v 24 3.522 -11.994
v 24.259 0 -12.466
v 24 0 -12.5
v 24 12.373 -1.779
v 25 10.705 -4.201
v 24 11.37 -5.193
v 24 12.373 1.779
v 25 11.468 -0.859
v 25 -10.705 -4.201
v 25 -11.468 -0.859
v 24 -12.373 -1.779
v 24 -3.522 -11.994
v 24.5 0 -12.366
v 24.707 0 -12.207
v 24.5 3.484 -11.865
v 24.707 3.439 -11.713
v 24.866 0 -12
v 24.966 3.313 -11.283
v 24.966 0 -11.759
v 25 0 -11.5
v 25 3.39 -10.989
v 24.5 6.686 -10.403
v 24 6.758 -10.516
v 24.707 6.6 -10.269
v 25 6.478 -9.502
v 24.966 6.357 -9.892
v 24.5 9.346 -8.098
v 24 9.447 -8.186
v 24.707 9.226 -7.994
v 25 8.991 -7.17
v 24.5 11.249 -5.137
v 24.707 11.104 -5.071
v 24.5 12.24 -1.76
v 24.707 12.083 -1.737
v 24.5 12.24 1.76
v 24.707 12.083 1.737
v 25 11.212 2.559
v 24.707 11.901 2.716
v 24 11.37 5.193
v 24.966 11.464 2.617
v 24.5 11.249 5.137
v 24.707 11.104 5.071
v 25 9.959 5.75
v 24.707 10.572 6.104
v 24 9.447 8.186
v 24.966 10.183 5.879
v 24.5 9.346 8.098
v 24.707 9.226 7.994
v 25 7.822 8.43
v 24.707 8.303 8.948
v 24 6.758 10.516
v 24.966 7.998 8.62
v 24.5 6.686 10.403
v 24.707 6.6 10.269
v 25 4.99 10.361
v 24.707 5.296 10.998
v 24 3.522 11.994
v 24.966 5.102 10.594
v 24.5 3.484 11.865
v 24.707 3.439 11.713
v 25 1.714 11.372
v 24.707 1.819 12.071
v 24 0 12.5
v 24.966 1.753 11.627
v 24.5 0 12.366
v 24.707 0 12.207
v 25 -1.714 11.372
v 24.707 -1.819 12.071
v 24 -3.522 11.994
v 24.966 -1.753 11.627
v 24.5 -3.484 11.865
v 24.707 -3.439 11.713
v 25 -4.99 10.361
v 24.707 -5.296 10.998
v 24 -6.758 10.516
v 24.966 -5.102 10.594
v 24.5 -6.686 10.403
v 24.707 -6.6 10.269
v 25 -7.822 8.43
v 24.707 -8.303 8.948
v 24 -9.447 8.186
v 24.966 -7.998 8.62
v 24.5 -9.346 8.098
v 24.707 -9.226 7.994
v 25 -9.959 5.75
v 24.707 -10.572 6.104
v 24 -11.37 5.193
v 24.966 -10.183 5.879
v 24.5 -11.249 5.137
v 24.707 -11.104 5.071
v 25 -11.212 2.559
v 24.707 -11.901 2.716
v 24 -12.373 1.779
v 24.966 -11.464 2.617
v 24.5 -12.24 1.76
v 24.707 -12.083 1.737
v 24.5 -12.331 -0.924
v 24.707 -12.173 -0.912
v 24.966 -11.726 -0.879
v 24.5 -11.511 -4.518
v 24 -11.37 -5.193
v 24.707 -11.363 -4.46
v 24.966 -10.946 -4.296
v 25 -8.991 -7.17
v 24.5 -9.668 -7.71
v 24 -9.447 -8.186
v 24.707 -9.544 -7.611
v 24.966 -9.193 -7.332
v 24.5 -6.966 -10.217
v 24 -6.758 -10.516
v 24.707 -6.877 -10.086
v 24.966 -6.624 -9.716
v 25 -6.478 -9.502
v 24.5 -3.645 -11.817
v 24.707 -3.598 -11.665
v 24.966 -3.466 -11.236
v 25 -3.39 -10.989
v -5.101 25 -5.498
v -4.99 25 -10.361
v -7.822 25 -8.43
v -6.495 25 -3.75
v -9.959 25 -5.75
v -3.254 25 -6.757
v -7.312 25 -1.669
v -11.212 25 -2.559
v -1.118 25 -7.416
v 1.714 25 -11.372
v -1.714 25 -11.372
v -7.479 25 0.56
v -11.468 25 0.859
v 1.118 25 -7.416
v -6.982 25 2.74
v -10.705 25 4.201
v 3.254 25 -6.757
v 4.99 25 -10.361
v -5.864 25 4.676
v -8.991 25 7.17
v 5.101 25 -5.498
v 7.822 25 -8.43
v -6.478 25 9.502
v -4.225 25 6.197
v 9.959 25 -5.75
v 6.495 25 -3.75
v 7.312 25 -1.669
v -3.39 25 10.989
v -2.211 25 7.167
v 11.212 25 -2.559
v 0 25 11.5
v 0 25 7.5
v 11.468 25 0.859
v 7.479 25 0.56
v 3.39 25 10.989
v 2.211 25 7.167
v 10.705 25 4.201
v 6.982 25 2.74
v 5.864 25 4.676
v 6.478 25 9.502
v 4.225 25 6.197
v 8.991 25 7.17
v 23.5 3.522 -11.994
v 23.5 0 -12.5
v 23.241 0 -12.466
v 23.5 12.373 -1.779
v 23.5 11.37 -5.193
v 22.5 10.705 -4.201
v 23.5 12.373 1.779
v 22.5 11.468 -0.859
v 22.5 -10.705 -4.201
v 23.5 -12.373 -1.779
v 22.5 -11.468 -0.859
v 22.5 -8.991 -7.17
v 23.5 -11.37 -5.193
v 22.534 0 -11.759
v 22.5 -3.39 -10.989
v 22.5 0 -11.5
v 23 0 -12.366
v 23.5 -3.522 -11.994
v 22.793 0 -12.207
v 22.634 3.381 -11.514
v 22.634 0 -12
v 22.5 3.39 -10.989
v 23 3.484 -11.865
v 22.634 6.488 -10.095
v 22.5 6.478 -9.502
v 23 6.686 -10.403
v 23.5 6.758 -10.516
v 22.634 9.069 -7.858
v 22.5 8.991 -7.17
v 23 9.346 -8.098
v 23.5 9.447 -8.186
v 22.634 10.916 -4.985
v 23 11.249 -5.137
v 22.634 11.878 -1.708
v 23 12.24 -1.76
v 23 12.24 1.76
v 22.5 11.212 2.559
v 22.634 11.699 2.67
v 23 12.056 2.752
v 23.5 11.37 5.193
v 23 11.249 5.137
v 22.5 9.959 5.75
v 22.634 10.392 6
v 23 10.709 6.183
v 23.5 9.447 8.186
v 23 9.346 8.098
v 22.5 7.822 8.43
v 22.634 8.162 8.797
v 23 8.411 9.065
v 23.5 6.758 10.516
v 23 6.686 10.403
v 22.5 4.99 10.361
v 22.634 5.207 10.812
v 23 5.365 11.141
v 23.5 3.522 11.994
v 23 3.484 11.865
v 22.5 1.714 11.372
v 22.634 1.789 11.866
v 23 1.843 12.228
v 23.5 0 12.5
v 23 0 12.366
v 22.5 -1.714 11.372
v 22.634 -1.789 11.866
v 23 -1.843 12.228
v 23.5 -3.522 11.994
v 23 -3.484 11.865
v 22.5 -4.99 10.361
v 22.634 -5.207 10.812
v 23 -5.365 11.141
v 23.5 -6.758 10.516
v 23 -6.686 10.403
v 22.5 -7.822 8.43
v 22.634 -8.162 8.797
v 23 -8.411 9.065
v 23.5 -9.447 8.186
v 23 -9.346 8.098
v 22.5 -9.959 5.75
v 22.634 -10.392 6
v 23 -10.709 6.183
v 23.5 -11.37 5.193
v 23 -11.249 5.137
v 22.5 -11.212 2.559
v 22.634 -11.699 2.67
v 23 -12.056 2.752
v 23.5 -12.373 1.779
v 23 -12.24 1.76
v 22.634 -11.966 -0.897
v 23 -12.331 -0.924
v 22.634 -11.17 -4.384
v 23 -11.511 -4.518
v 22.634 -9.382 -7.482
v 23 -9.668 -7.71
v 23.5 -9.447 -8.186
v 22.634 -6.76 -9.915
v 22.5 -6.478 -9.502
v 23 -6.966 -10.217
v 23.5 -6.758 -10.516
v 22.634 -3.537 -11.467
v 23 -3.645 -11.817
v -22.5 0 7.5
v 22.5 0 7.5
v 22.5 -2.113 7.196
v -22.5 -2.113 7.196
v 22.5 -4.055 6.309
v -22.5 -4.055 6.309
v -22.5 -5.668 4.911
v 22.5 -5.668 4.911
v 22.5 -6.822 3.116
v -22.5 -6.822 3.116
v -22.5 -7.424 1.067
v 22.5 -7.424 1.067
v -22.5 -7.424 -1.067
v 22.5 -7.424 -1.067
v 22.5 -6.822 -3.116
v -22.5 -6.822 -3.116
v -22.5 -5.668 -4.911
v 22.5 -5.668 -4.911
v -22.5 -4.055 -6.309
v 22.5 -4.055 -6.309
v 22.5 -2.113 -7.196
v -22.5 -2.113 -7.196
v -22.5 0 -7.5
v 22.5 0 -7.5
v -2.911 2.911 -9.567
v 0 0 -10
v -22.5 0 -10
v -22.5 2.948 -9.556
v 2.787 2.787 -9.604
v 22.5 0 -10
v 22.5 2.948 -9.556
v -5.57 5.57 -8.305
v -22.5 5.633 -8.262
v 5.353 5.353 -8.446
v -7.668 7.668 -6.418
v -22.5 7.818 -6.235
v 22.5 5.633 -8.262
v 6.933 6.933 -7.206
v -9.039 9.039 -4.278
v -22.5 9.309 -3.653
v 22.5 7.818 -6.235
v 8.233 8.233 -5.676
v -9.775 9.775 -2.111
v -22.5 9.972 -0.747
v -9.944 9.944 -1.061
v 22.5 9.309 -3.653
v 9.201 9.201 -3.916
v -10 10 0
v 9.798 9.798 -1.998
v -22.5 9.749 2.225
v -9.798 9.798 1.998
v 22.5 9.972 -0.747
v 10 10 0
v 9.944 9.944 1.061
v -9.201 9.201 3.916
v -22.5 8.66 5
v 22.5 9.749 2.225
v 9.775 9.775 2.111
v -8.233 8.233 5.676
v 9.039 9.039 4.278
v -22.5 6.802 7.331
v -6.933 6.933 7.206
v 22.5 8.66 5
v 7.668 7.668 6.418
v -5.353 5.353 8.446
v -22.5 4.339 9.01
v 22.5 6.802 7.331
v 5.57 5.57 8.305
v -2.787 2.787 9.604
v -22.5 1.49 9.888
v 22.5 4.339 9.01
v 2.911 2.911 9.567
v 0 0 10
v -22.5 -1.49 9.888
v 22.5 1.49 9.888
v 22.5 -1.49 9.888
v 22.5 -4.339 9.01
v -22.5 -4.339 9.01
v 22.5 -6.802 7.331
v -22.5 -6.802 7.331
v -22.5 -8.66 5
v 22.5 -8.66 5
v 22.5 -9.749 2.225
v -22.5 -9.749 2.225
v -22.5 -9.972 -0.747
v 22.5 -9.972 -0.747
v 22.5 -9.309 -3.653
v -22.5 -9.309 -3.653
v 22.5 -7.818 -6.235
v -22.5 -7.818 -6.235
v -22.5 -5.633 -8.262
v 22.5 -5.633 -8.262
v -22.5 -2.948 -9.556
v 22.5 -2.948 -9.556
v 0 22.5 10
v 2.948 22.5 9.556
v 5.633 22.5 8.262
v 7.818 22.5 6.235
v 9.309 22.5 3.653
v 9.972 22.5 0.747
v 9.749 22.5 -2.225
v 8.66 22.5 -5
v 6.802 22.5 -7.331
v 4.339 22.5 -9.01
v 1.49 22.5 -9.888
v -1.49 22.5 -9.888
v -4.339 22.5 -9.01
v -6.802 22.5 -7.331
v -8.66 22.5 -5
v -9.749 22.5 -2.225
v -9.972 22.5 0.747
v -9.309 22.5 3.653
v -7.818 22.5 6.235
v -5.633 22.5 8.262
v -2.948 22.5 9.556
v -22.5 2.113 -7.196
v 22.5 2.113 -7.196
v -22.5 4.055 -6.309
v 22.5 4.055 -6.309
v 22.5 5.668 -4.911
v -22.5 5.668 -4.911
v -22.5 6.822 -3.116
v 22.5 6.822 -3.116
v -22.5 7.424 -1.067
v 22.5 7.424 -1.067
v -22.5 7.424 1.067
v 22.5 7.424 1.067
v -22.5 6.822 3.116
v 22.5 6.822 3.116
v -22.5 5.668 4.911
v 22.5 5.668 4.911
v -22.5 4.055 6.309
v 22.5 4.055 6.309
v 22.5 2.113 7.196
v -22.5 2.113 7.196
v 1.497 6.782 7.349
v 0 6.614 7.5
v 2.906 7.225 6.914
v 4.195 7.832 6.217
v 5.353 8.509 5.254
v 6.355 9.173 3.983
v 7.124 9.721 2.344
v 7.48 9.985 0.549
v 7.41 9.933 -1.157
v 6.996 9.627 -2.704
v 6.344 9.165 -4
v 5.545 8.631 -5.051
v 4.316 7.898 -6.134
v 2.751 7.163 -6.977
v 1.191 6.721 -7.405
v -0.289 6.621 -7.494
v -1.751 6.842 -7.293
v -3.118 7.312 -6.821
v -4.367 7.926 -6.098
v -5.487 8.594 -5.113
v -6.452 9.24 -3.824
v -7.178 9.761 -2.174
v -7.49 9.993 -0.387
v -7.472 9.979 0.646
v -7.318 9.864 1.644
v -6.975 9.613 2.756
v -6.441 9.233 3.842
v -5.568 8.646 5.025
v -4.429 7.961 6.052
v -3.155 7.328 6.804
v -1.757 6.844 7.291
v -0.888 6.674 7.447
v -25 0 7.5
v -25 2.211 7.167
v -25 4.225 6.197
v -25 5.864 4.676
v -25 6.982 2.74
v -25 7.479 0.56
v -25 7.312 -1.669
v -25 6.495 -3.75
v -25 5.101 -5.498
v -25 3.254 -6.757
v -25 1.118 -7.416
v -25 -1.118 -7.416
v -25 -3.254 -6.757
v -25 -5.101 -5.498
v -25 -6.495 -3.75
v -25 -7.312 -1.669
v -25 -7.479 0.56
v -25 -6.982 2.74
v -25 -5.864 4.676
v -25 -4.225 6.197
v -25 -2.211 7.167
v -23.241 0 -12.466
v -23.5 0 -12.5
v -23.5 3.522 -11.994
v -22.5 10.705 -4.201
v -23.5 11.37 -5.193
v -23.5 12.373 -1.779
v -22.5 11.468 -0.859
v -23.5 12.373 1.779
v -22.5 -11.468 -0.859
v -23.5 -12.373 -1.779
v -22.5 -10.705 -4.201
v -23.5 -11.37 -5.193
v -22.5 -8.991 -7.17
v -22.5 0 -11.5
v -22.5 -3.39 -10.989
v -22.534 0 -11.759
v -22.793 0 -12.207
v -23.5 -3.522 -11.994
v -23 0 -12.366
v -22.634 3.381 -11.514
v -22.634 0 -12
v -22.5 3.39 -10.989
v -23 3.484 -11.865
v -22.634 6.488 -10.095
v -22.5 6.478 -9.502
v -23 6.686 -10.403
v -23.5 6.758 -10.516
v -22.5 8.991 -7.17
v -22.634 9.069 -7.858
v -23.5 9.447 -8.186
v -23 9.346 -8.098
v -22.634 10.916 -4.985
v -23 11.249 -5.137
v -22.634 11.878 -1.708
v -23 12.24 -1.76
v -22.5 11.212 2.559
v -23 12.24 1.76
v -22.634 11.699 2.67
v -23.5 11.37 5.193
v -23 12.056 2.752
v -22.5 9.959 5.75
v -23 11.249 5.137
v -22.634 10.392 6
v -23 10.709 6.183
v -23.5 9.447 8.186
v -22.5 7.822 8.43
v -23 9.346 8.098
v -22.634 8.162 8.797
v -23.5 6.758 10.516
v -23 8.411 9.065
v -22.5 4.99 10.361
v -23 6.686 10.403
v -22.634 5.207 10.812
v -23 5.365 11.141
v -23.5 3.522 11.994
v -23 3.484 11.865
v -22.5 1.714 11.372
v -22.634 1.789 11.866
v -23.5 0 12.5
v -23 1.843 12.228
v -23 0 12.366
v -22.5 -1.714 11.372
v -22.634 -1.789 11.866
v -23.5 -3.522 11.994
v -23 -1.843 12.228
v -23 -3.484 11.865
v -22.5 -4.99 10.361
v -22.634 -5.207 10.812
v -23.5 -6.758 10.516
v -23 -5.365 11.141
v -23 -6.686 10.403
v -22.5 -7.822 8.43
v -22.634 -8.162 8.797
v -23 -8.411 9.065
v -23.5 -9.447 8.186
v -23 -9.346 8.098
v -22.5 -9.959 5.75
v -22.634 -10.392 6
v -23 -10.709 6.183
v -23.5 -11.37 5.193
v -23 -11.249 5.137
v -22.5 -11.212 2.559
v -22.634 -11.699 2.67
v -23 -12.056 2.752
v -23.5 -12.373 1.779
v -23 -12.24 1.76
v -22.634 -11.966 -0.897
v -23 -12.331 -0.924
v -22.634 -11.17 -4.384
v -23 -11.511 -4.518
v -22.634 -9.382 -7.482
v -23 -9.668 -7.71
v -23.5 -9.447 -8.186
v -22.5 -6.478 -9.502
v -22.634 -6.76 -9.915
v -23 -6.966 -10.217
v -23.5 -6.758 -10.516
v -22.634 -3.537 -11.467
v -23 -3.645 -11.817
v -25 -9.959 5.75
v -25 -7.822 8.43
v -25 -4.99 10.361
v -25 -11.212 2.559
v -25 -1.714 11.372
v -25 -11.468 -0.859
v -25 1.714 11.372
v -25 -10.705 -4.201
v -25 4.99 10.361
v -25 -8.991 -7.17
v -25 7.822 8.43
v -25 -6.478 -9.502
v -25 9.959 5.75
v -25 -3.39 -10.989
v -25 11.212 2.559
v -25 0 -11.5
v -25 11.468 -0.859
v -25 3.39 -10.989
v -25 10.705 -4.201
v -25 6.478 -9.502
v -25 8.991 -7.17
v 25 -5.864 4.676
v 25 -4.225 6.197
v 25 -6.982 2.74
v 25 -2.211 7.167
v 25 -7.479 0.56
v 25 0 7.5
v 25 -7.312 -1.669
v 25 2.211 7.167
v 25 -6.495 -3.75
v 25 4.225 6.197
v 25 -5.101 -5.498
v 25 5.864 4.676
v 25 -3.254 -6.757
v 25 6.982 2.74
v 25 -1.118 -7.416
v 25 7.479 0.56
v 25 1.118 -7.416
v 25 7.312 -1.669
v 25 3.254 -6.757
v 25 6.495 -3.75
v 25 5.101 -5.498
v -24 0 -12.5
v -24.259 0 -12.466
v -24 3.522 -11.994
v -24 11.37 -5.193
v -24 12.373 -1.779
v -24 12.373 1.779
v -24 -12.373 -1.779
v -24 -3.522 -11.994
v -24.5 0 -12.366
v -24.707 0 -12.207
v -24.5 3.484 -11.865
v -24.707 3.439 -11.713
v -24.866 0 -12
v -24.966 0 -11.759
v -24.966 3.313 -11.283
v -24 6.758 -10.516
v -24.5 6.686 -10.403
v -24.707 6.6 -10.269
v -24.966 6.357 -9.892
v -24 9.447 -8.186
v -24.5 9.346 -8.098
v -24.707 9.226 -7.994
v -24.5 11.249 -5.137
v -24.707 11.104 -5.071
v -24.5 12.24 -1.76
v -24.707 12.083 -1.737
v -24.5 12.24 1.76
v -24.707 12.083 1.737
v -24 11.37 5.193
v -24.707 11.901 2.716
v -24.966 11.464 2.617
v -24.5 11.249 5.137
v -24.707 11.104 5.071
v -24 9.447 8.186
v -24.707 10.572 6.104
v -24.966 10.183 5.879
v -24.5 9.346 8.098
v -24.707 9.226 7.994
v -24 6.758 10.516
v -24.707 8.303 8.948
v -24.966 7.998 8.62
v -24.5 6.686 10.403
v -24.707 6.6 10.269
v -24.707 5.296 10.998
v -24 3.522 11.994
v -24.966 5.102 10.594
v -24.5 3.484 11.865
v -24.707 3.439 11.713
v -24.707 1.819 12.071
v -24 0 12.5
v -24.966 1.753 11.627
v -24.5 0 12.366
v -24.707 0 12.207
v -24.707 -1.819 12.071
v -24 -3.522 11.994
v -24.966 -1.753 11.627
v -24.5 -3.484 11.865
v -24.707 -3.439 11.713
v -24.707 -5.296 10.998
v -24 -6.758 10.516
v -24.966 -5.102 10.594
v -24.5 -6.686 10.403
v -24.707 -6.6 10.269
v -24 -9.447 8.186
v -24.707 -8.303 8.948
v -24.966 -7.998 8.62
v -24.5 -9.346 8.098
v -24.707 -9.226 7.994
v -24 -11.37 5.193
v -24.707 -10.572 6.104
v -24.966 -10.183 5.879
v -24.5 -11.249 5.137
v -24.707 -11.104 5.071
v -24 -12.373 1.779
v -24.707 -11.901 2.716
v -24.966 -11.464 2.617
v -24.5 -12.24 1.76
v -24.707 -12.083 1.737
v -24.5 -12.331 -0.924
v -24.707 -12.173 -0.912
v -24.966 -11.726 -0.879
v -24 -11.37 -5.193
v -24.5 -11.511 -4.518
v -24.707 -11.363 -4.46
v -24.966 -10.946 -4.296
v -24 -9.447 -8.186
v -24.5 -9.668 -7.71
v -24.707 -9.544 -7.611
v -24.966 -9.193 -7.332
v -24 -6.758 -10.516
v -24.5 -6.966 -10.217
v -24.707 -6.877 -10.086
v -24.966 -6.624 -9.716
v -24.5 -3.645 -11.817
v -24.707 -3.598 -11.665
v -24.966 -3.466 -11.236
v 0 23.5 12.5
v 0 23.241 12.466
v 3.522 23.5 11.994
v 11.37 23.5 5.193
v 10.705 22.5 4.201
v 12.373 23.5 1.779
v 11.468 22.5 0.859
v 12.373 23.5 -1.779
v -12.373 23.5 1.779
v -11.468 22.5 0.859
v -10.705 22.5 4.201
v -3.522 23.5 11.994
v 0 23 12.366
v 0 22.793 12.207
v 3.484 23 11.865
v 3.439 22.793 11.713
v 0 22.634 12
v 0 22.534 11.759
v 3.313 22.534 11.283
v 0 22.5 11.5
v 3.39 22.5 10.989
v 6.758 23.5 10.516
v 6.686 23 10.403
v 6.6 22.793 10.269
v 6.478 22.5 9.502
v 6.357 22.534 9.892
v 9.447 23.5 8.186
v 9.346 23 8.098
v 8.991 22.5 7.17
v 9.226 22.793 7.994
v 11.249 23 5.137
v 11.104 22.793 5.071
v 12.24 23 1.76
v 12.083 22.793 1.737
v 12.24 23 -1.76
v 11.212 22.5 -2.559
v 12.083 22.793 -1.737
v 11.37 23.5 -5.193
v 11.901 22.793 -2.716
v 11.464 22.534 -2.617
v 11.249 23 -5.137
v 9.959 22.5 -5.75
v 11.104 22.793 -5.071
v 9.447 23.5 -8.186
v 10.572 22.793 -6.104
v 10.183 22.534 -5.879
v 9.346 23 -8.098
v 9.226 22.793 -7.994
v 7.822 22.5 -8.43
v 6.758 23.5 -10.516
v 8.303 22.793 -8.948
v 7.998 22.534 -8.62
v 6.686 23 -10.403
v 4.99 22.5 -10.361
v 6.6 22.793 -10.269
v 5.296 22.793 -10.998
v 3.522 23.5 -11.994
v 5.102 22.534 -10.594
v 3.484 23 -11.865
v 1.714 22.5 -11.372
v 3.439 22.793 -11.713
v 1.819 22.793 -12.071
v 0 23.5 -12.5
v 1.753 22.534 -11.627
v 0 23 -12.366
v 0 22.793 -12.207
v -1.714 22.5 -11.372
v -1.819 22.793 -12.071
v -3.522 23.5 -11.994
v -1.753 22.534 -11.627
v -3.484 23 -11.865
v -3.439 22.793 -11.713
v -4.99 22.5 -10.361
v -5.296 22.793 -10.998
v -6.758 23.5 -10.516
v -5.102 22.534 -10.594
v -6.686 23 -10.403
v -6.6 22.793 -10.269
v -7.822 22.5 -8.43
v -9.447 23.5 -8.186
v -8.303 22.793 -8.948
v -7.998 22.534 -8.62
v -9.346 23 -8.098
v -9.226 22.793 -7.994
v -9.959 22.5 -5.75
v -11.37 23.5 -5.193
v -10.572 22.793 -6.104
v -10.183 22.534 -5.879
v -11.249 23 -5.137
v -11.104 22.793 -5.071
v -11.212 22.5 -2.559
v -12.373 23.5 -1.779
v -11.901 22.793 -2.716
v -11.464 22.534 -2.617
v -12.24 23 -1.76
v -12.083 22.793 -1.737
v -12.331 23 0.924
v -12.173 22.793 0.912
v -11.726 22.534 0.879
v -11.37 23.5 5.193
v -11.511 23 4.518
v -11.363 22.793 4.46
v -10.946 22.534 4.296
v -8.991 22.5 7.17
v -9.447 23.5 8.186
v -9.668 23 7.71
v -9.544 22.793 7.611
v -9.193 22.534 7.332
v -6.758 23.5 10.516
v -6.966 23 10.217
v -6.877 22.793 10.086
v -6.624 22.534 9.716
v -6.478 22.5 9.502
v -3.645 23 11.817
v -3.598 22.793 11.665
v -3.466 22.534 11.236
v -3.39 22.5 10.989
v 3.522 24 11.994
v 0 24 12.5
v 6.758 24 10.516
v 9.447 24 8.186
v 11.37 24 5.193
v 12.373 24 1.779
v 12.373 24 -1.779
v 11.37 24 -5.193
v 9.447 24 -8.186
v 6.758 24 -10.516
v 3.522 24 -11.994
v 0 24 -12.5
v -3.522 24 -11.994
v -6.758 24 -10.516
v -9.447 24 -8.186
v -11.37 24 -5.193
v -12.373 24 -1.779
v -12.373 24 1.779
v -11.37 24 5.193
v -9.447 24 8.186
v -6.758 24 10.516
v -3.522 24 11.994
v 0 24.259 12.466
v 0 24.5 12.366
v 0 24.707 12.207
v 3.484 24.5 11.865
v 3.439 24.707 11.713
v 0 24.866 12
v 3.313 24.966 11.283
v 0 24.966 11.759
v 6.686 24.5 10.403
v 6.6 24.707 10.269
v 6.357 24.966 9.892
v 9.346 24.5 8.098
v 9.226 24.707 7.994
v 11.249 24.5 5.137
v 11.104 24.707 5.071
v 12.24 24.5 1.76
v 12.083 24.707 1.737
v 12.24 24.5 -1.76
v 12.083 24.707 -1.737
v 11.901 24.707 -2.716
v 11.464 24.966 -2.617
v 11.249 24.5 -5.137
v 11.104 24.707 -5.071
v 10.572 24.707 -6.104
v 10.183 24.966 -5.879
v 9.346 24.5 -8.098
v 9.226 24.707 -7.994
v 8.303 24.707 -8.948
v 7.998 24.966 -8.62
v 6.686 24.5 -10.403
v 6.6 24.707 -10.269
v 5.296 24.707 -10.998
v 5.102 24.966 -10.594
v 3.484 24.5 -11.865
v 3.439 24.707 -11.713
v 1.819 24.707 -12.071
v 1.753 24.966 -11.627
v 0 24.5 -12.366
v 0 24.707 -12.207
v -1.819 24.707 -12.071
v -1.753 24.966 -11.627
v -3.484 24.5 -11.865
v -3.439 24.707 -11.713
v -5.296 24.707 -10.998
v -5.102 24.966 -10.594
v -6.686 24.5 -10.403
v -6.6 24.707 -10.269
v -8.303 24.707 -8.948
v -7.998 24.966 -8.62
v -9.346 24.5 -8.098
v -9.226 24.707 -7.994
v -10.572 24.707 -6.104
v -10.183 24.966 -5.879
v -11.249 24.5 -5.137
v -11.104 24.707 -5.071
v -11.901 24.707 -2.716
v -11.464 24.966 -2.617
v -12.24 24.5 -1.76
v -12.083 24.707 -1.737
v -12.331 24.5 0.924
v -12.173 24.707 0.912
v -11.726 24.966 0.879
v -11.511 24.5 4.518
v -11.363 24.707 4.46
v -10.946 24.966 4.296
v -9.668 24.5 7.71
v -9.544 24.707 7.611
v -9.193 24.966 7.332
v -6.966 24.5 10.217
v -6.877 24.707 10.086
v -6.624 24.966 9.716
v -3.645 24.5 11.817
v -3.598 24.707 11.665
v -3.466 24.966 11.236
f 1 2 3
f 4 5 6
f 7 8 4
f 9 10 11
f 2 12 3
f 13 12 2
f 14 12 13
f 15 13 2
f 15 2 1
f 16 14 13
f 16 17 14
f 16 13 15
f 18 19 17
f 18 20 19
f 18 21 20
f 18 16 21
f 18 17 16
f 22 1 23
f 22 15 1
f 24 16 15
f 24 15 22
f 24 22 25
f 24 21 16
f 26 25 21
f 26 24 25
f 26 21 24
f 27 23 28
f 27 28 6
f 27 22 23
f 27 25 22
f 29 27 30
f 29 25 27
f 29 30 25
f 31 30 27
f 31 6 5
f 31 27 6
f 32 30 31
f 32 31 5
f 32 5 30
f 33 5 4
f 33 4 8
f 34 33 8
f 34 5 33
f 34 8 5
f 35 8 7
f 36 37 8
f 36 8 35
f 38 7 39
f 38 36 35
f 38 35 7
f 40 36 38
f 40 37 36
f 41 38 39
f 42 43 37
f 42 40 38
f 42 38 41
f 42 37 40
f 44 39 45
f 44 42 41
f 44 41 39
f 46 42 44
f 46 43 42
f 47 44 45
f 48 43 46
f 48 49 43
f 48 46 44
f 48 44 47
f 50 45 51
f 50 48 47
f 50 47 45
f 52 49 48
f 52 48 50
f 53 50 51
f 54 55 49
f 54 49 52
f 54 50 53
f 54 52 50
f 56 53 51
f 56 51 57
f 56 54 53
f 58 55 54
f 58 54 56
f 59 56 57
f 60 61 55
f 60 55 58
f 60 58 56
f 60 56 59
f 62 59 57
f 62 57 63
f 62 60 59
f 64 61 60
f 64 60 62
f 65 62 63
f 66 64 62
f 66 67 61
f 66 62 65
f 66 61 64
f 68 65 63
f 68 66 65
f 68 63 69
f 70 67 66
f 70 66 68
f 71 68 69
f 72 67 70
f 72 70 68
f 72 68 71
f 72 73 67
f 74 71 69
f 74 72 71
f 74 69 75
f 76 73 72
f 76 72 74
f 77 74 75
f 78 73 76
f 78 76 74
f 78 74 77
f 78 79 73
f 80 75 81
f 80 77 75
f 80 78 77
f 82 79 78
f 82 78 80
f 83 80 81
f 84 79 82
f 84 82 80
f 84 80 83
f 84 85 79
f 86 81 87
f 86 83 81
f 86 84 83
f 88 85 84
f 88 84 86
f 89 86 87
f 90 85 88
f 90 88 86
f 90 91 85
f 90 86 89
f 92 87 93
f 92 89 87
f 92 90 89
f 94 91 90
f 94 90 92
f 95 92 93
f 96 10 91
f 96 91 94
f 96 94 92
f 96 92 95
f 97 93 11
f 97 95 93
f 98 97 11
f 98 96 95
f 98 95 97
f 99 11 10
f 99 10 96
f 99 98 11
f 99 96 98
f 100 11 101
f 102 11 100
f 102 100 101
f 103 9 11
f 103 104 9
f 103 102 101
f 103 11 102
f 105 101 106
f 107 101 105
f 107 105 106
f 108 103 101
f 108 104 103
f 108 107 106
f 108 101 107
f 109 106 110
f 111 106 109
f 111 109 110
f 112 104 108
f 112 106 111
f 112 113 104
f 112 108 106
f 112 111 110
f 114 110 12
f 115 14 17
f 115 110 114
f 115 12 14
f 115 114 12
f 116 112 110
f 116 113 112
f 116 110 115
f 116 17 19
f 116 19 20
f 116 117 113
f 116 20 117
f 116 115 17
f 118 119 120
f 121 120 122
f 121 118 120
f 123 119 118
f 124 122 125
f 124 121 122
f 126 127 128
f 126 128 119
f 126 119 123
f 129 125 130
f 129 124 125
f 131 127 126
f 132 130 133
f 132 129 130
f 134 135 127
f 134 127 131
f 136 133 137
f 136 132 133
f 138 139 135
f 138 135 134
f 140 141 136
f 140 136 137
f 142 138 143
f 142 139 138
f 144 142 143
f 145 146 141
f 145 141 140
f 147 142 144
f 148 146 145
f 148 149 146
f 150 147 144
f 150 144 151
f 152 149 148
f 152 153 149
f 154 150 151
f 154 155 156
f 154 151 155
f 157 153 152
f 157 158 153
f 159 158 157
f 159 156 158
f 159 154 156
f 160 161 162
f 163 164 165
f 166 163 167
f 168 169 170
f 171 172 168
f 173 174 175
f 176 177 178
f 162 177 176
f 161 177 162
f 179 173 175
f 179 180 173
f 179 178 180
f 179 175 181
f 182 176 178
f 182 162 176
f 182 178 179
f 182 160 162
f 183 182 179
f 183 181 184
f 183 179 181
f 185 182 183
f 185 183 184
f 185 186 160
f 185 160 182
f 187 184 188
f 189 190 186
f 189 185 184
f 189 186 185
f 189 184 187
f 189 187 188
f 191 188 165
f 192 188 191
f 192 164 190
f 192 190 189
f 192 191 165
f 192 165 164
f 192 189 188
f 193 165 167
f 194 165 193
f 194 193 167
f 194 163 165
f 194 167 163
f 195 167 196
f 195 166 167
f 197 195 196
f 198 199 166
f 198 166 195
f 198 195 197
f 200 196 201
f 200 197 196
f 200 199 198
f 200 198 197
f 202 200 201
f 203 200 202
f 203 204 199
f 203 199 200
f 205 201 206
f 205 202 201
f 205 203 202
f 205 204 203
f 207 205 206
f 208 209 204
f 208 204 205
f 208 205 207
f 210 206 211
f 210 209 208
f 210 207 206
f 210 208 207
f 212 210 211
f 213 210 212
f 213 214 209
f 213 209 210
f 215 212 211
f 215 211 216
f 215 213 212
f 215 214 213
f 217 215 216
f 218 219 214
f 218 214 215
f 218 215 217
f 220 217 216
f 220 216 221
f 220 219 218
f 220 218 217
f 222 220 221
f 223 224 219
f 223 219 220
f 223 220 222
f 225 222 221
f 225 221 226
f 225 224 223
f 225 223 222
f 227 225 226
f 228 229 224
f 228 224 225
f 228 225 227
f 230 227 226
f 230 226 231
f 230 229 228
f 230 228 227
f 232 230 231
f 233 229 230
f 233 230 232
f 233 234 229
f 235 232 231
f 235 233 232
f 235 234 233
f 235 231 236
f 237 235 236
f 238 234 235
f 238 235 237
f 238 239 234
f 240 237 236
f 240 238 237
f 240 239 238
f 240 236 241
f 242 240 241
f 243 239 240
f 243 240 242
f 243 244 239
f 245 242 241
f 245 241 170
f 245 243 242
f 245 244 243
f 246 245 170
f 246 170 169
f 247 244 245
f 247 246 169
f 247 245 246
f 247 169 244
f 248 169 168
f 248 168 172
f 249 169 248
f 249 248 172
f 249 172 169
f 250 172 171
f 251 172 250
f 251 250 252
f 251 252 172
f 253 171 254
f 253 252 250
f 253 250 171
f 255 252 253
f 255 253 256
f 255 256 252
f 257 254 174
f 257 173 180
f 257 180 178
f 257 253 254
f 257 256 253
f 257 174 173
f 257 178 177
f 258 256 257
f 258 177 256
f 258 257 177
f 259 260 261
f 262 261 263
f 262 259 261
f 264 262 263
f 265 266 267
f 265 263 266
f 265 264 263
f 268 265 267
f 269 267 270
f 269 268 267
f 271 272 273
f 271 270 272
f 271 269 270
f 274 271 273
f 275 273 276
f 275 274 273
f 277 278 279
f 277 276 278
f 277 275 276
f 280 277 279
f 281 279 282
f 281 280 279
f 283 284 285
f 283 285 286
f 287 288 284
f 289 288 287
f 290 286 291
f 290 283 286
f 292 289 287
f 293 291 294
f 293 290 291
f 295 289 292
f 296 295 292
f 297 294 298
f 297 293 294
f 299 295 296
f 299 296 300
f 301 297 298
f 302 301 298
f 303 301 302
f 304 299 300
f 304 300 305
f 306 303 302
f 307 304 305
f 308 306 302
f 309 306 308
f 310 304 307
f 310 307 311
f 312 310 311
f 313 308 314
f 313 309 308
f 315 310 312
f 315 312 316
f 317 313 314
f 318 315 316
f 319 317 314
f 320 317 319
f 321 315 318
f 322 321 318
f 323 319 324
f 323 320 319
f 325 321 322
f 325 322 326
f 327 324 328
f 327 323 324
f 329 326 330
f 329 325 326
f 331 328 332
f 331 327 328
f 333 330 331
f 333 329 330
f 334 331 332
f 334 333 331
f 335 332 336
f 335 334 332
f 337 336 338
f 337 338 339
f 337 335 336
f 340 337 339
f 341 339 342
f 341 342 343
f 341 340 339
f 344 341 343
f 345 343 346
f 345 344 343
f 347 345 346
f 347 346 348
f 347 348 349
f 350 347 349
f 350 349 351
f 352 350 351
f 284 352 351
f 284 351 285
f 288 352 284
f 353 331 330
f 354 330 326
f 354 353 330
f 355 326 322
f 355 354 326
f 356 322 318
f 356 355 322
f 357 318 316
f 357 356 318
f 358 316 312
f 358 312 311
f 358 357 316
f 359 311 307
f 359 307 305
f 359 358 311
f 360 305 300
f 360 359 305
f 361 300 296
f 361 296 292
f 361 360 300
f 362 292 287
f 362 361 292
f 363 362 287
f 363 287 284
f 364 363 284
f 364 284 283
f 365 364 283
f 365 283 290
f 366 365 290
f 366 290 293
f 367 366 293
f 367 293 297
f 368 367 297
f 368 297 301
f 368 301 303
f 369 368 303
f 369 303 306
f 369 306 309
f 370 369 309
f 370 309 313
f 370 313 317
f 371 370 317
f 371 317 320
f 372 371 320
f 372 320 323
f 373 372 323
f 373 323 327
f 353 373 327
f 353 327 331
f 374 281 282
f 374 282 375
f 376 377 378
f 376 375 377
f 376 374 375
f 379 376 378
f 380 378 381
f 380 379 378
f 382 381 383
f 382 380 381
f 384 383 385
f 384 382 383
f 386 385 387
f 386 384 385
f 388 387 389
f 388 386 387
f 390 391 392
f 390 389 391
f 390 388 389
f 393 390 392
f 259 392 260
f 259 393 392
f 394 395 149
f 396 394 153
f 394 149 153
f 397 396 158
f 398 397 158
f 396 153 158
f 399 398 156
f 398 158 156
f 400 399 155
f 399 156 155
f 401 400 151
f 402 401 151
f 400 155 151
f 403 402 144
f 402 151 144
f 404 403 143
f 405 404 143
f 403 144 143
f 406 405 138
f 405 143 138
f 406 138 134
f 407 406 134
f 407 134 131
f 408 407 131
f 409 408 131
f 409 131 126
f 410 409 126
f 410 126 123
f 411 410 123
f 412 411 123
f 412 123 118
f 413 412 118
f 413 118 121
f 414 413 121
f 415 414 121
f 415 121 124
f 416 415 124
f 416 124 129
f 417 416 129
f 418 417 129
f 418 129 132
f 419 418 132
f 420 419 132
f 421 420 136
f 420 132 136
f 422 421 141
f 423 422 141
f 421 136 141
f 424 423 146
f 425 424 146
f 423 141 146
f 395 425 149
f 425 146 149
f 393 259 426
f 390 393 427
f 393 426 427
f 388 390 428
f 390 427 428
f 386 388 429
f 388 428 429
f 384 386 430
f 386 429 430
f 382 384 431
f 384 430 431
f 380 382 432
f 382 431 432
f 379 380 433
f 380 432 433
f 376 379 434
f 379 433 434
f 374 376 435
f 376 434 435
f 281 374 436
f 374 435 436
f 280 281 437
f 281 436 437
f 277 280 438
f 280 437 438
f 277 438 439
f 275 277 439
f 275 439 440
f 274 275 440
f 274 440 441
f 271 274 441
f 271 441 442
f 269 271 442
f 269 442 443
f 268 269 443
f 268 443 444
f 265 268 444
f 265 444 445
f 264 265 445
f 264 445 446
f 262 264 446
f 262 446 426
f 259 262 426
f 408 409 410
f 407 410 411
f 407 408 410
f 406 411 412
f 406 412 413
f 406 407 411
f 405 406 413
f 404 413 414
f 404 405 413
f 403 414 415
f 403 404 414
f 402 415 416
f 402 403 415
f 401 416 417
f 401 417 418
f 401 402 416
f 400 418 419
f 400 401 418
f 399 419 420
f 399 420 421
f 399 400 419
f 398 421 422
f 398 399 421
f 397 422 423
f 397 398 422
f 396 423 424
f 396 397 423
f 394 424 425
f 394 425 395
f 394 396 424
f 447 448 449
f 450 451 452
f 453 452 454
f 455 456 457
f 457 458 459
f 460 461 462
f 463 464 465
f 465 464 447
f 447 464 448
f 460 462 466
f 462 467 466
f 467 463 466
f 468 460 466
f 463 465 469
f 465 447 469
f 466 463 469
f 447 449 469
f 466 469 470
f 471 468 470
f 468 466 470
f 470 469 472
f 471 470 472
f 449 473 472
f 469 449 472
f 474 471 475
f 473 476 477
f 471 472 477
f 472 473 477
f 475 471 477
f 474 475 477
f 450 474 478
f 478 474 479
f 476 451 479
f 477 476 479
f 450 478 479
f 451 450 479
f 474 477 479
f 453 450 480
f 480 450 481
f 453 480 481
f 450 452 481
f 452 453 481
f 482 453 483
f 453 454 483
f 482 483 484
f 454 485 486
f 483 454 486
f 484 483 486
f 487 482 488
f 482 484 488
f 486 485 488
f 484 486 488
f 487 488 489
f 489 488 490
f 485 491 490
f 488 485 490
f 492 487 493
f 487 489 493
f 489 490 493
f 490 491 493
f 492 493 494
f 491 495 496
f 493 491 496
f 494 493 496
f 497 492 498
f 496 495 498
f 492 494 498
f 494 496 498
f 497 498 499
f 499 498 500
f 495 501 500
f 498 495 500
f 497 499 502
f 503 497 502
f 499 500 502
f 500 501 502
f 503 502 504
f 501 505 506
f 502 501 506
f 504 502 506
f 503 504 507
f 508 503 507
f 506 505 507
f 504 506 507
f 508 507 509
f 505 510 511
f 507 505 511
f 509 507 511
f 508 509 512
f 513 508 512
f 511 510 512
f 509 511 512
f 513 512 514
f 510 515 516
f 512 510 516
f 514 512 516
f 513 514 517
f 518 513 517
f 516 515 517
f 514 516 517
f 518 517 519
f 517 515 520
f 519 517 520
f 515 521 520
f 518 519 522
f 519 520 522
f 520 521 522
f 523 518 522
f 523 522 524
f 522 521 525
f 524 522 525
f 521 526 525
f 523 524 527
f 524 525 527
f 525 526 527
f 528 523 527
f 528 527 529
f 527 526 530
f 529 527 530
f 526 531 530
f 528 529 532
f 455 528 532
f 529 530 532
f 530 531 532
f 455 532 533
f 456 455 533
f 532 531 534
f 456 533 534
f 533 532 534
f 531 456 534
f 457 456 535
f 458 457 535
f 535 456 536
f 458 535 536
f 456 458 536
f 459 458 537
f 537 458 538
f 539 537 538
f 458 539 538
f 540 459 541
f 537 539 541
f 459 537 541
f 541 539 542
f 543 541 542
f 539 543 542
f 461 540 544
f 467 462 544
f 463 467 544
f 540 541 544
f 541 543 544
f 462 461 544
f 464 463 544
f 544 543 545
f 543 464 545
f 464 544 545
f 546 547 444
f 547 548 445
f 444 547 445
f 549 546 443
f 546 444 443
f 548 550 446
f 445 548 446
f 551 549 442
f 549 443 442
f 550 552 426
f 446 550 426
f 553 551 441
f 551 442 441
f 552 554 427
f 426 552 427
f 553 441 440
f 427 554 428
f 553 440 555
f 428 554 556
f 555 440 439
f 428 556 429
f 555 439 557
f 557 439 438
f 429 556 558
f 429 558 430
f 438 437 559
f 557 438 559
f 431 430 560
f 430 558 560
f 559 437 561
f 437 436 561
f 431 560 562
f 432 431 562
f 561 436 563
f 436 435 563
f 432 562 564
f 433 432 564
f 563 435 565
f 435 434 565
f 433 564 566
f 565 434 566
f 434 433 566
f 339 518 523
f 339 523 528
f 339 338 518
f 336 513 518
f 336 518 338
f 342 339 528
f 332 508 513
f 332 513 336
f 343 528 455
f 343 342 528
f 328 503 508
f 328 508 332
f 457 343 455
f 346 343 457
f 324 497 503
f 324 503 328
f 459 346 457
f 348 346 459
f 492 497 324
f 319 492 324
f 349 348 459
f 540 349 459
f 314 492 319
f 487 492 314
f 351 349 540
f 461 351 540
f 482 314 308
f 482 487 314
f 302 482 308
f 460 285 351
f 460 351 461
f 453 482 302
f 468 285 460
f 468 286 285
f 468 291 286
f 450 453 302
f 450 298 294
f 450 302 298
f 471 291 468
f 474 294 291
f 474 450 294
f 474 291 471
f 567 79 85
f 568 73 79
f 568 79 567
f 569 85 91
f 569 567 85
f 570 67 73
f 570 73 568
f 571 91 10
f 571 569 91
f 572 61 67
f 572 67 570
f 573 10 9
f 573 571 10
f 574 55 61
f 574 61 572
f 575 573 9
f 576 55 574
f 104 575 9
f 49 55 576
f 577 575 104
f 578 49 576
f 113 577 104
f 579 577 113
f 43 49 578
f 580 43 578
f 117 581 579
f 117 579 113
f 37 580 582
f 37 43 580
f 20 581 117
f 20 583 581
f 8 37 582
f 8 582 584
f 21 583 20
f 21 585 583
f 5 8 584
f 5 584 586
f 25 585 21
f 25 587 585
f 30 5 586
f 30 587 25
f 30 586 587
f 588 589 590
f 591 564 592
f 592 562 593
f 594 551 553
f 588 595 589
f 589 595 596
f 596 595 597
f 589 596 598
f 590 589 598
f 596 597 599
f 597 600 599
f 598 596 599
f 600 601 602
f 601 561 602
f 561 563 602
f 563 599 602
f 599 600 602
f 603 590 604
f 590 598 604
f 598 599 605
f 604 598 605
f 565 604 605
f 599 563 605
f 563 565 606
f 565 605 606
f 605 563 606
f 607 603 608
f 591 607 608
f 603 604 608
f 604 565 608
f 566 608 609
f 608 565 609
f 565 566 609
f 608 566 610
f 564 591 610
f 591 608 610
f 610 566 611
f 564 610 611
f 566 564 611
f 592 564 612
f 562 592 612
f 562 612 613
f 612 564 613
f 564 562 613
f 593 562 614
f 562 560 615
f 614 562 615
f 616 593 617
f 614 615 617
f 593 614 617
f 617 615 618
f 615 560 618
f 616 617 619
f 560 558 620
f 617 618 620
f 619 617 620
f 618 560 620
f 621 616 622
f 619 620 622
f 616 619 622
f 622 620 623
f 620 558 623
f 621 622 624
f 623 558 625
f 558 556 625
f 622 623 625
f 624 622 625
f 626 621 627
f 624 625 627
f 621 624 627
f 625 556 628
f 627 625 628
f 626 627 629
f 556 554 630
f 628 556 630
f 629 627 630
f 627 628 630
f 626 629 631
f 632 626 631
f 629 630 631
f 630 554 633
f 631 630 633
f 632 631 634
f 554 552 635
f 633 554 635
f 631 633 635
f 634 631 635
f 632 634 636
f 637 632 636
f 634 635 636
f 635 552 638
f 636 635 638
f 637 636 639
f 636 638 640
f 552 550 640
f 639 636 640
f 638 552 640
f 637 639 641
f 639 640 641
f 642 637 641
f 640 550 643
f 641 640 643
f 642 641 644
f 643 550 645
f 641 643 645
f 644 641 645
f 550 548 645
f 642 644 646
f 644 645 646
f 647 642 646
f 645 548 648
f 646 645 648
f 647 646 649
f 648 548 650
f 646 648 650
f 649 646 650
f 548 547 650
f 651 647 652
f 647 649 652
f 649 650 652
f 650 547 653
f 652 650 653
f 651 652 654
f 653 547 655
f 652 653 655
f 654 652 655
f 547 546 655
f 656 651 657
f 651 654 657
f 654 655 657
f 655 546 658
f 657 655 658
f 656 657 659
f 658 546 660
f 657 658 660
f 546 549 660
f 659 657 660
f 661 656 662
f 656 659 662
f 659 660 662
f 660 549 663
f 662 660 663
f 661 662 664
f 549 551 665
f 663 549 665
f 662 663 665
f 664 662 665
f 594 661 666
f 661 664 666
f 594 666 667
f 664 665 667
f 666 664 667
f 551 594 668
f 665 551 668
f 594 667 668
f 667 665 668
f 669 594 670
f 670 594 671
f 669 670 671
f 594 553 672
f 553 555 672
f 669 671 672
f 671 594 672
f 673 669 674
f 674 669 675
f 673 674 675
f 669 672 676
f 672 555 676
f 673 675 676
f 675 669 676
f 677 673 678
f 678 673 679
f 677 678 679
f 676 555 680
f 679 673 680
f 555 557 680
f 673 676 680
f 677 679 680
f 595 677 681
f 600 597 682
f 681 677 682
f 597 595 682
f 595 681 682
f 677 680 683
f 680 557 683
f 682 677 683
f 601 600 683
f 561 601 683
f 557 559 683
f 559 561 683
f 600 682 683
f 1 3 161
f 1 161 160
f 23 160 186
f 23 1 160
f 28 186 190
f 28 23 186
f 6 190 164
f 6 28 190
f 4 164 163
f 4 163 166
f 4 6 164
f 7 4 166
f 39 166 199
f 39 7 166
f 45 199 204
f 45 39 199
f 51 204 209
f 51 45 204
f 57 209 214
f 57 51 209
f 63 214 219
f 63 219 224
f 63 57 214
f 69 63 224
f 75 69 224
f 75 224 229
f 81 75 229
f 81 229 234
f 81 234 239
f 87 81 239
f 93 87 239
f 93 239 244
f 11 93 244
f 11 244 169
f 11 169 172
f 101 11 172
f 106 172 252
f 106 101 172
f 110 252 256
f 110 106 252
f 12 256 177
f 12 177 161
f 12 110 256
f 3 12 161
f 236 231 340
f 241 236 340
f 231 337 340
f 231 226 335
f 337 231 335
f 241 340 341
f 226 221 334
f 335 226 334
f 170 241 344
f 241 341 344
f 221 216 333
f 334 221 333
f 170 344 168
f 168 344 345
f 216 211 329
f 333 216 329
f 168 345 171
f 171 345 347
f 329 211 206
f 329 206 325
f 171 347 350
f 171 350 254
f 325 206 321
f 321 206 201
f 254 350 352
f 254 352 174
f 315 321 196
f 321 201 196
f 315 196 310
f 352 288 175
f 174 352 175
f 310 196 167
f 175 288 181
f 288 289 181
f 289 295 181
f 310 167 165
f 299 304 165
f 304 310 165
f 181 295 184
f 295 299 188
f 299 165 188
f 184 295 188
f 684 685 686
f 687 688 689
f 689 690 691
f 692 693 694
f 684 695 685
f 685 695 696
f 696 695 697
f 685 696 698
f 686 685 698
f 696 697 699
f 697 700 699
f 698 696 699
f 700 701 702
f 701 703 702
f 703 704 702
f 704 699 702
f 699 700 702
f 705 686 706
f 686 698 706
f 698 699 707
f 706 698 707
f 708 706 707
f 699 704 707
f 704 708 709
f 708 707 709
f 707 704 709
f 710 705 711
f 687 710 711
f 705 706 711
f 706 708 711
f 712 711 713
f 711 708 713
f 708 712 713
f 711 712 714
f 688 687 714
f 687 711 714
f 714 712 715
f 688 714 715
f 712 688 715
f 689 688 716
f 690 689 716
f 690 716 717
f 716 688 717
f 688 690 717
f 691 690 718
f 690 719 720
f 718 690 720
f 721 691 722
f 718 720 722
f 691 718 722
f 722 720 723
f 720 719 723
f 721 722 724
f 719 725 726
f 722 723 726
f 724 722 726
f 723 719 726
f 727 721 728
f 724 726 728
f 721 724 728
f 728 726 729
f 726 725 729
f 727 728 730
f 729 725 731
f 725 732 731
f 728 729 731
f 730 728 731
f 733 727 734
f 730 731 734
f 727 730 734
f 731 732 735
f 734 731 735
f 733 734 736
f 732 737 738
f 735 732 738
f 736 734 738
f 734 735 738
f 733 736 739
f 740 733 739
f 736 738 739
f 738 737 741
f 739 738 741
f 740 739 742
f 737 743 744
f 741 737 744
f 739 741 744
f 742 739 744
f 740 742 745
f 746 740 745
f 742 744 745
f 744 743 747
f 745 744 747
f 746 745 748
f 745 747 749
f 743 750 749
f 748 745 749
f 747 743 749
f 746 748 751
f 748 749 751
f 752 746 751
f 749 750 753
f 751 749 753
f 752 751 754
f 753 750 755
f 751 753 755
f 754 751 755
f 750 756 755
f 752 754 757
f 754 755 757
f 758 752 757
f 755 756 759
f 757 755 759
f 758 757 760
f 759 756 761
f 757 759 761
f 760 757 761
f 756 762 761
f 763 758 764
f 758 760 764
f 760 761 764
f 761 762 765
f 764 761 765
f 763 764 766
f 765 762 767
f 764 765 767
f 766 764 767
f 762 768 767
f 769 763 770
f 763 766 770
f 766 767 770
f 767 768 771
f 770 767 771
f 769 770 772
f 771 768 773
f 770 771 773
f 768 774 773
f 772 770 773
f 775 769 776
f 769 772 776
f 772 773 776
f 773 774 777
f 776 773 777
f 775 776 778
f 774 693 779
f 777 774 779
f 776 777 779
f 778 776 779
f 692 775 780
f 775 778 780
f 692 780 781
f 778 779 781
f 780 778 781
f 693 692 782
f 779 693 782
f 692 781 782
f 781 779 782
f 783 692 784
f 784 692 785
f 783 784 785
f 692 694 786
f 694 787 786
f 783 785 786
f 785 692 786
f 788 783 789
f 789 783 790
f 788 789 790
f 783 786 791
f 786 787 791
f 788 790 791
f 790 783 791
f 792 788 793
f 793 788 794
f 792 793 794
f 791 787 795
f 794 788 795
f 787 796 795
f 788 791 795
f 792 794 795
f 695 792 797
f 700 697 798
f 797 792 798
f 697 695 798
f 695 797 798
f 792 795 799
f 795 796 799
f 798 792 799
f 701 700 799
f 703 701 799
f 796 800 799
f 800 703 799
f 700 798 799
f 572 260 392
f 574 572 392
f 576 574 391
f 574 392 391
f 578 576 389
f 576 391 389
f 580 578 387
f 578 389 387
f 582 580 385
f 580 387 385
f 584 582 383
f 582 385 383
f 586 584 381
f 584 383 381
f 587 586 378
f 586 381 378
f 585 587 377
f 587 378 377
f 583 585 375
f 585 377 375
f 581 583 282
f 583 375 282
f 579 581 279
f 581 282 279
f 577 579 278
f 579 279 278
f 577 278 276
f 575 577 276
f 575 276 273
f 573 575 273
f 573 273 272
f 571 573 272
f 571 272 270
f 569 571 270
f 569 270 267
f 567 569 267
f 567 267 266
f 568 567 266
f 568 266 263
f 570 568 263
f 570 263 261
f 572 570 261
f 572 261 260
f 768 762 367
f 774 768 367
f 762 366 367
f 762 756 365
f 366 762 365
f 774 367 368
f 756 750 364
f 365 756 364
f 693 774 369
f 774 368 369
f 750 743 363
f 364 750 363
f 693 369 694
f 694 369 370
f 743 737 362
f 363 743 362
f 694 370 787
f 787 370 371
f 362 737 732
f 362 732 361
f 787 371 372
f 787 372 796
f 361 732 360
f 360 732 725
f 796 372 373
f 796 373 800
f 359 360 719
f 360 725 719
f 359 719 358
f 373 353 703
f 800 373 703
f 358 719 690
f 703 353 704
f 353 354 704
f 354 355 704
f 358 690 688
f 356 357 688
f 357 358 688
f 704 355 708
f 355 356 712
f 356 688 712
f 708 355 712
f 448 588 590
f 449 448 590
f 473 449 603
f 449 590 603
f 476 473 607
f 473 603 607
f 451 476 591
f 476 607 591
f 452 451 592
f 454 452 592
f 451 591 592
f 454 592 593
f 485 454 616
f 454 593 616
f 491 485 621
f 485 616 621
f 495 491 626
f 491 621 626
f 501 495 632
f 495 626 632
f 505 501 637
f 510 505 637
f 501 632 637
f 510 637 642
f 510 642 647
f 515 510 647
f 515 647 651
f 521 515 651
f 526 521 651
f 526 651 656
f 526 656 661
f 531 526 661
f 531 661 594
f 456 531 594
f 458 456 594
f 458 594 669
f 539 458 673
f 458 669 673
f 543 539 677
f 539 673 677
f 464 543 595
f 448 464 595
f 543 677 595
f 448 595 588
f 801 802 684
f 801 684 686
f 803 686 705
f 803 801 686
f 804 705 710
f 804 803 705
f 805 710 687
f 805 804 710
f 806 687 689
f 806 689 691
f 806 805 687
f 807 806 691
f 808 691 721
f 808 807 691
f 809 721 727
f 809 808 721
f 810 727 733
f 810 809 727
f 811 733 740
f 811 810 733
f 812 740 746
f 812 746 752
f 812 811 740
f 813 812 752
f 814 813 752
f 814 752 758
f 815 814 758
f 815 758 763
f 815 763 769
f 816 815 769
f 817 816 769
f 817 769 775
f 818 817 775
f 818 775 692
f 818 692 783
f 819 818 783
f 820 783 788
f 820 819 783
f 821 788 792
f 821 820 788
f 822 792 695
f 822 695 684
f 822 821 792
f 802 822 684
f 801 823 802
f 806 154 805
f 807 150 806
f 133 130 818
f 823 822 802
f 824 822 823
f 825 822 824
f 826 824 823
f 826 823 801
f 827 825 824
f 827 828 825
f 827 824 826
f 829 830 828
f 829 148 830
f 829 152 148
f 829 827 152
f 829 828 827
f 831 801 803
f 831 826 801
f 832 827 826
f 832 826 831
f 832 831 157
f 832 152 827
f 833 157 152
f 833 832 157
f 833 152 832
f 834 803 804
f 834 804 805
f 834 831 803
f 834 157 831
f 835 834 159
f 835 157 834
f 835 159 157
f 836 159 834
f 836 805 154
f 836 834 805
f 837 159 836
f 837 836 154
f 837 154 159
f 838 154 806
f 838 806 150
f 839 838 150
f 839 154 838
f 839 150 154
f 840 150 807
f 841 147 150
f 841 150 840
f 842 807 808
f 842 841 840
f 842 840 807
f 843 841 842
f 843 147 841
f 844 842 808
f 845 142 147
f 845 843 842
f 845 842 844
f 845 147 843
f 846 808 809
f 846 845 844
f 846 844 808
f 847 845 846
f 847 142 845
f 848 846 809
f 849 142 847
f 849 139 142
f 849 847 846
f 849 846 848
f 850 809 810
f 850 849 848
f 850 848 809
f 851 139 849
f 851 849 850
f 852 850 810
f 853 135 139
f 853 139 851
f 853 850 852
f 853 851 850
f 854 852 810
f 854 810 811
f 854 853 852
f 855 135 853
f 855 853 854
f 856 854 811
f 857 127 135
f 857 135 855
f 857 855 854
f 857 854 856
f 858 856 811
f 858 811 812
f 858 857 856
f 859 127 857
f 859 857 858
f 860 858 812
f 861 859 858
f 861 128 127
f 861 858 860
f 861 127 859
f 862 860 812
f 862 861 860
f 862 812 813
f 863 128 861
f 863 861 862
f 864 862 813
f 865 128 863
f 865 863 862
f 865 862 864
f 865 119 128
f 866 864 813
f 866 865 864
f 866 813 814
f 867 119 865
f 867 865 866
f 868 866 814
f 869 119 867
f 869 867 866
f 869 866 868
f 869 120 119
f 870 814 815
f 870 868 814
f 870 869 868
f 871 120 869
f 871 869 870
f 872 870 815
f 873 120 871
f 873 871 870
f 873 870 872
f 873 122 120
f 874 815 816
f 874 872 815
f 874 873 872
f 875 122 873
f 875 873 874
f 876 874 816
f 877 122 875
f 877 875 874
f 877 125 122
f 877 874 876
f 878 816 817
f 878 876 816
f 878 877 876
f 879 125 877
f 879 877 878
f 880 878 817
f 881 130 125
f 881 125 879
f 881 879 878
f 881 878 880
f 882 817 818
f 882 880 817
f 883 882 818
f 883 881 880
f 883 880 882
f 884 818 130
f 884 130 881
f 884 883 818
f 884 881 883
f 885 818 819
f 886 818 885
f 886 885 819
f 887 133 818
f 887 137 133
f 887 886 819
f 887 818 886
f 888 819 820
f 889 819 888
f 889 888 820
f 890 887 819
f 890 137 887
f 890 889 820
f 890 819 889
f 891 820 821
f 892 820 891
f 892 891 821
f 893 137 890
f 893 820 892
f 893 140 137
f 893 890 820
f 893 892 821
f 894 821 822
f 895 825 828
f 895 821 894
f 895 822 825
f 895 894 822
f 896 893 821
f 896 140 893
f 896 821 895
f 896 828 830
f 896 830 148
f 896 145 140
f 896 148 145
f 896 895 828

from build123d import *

# Parameters (mm, degrees)
SKETCH1_R                = 10
SKETCH1_R_2              = 7.5
BOSS_EXTRUDE1_DEPTH      = 25
SKETCH2_R                = 12.5
BOSS_EXTRUDE2_DEPTH      = 2.5
BOSS_EXTRUDE3_REACH      = 48.771
BOSS_EXTRUDE3_END_RADIUS = 10
SKETCH3_R                = 10
SKETCH3_R_2              = 7.5
SKETCH5_R                = 12.5
SKETCH5_R_2              = 7.5
BOSS_EXTRUDE4_DEPTH      = 2.5
HOLE1_D                  = 15
FILLET1_R                = 1


with BuildPart() as part:
    # Sketch1 → Boss-Extrude1 (new, symmetric)
    with BuildSketch(Plane(origin=(0, 0, 0), x_dir=(0, 0, -1), z_dir=(1, 0, 0))):
        Circle(SKETCH1_R)
        Circle(SKETCH1_R_2, mode=Mode.SUBTRACT)
    extrude(amount=BOSS_EXTRUDE1_DEPTH, both=True)

    # Sketch2 → Boss-Extrude2 (add)
    with BuildSketch(Plane(origin=(25, 0, 0), x_dir=(0, 0, -1), z_dir=(1, 0, 0))):
        Circle(SKETCH2_R)
    boss_extrude2 = extrude(amount=-BOSS_EXTRUDE2_DEPTH)

    # Mirror1: Boss-Extrude2 across plane
    add(boss_extrude2.mirror(Plane(origin=(0, 0, 0), x_dir=(0, 0, 1), z_dir=(1, 0, 0))))

    # Boss-Extrude3: up to this cylinder (the profile starts outside it)
    boss_extrude3_end = Plane(origin=(0, 0, 0), z_dir=(-1, 0, 0)) * Cylinder(BOSS_EXTRUDE3_END_RADIUS, 118.542, mode=Mode.PRIVATE)
    # Sketch3 → Boss-Extrude3 (add, up to the surface)
    with BuildSketch(Plane(origin=(0, 25, 0), x_dir=(1, 0, 0), z_dir=(0, 1, 0)), mode=Mode.PRIVATE) as boss_extrude3_sk1:
        with Locations(Location((0, 0, 0), (0, 0, 270))):
            Circle(SKETCH3_R)
        with Locations(Location((0, 0, 0), (0, 0, 270))):
            Circle(SKETCH3_R_2, mode=Mode.SUBTRACT)
    boss_extrude3_tool1 = extrude(boss_extrude3_sk1.sketch, amount=-BOSS_EXTRUDE3_REACH, mode=Mode.PRIVATE) - boss_extrude3_end
    add(boss_extrude3_tool1.solids().sort_by_distance((0, 25, -9.717157))[0])

    # Sketch5 → Boss-Extrude4 (add)
    with BuildSketch(Plane(origin=(0, 25, 0), x_dir=(1, 0, 0), z_dir=(0, 1, 0))):
        with Locations(Location((0, 0, 0), (0, 0, 270))):
            Circle(SKETCH5_R)
        with Locations(Location((0, 0, 0), (0, 0, 270))):
            Circle(SKETCH5_R_2, mode=Mode.SUBTRACT)
    extrude(amount=-BOSS_EXTRUDE4_DEPTH)

    # Hole1 (through all)
    with Locations(Plane(origin=(25, 0, 0), x_dir=(0, 0, -1), z_dir=(1, 0, 0))):
        with Locations((0, 0)):
            Hole(HOLE1_D / 2)

    # Fillet1
    fillet1_edges = [part.edges().sort_by_distance(p)[0] for p in [
        (22.5, 0, 12.5),
        (25, 0, 12.5),
        (-25, 0, 12.5),
        (-22.5, 0, 12.5),
        (0, 22.5, -12.5),
        (0, 25, -12.5),
    ]]
    fillet(fillet1_edges, radius=FILLET1_R)


solid = part.part
